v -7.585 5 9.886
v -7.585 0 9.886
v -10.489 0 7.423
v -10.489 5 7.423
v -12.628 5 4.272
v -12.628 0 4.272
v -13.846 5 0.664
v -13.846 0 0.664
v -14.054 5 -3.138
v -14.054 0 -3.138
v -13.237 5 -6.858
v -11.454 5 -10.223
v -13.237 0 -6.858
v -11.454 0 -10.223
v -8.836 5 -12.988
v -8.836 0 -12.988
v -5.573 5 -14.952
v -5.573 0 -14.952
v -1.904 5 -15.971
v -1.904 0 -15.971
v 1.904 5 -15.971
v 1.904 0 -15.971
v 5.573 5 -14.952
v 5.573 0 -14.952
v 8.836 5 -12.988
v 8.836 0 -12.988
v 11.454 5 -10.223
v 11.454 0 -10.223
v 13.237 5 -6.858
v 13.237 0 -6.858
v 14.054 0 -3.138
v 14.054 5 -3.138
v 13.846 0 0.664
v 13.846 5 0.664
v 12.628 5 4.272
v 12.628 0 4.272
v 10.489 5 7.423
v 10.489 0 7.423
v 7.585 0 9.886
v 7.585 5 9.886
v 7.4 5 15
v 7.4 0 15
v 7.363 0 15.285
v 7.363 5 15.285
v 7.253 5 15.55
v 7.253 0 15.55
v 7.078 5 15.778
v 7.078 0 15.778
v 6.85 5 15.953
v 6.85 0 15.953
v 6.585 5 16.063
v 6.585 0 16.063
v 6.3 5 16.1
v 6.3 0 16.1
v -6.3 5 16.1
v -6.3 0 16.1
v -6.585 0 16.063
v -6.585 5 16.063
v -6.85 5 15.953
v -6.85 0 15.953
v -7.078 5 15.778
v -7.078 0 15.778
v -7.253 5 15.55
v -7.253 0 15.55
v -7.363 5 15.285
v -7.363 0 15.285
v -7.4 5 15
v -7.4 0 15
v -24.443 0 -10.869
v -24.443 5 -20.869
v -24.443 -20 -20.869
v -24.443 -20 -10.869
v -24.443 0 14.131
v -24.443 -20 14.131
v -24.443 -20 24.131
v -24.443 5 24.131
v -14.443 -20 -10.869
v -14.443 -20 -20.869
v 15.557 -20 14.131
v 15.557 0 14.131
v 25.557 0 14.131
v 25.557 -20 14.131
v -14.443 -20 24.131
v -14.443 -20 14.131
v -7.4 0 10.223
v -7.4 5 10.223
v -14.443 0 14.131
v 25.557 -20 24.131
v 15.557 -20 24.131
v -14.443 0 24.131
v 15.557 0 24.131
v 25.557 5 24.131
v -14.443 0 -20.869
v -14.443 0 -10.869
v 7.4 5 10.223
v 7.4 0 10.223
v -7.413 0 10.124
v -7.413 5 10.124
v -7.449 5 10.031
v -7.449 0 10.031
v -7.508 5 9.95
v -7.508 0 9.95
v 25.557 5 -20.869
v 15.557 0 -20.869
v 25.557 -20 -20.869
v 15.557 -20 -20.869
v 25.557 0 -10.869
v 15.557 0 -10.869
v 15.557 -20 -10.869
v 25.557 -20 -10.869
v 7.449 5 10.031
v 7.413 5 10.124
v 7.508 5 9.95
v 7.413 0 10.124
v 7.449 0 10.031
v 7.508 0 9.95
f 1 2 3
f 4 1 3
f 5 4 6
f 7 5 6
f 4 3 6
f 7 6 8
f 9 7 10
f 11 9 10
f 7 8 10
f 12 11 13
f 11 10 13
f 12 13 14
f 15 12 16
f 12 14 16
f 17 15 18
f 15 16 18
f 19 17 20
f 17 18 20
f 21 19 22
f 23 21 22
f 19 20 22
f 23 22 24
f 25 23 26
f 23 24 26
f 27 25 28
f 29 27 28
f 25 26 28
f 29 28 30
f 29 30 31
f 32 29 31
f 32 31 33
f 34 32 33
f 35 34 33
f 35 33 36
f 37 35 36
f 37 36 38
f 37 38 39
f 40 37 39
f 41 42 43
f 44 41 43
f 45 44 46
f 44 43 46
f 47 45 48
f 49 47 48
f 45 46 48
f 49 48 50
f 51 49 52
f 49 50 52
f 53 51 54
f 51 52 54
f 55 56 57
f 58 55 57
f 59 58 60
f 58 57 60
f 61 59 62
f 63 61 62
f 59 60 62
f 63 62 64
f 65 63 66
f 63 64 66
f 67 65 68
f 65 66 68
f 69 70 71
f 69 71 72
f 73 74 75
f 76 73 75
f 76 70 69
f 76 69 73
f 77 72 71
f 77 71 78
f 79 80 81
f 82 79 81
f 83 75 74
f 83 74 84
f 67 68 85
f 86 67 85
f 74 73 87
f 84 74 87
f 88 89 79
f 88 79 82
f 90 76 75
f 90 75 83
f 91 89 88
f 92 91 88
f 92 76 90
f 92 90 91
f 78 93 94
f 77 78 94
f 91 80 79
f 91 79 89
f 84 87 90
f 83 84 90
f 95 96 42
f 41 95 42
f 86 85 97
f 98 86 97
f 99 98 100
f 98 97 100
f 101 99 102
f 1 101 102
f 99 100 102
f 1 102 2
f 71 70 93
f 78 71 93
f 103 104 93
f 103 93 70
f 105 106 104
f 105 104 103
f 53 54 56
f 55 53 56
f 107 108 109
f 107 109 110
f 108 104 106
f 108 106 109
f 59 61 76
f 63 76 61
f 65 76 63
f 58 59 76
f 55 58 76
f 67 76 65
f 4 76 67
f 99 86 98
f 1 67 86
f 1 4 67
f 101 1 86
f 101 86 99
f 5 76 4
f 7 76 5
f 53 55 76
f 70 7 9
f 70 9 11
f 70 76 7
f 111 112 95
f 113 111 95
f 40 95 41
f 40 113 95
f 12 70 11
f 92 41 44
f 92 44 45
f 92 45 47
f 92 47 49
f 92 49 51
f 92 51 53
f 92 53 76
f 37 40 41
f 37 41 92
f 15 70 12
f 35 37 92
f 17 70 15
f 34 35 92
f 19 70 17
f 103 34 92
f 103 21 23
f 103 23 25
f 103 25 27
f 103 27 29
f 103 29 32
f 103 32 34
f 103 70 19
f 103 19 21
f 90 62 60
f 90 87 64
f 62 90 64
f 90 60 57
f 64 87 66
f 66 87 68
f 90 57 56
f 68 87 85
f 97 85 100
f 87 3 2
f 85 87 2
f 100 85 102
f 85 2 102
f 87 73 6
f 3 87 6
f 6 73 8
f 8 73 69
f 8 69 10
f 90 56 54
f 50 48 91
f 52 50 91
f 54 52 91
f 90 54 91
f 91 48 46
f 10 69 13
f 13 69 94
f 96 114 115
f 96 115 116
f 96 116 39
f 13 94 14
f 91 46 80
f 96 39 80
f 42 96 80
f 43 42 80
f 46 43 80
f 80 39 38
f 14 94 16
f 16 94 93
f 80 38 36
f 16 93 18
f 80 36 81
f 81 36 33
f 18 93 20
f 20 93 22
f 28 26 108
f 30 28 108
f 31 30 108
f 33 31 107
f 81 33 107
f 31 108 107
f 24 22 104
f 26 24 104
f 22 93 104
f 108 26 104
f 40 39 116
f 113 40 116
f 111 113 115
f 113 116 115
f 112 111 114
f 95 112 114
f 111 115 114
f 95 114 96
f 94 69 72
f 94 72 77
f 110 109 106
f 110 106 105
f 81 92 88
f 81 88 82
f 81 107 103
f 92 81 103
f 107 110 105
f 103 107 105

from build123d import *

# Parameters (mm, degrees)
SKETCH1_W           = 50
SKETCH1_H           = 45
BOSS_EXTRUDE1_DEPTH = 5
SKETCH2_W           = 10
SKETCH2_H           = 10
BOSS_EXTRUDE2_DEPTH = 20


with BuildPart() as part:
    # Sketch1 → Boss-Extrude1 (new body)
    with BuildSketch(Plane(origin=(0, 0, 0), x_dir=(1, 0, 0), z_dir=(0, 1, 0))):
        with Locations((0.556666279, -1.630839984)):
            Rectangle(SKETCH1_W, SKETCH1_H)
        with BuildLine():
            Line((-7.4, -15), (-7.4, -10.223338333))
            ThreePointArc((-7.4, -10.223338333), (-7.449237284, -10.031074147), (-7.584827586, -9.886142793))
            ThreePointArc((-7.584827586, -9.886142793), (0, 16.1), (7.584827586, -9.886142793))
            ThreePointArc((7.584827586, -9.886142793), (7.449237284, -10.031074147), (7.4, -10.223338333))
            Line((7.4, -10.223338333), (7.4, -15))
            ThreePointArc((7.4, -15), (7.077817459, -15.777817459), (6.3, -16.1))
            Line((6.3, -16.1), (-6.3, -16.1))
            ThreePointArc((-6.3, -16.1), (-7.077817459, -15.777817459), (-7.4, -15))
        make_face(mode=Mode.SUBTRACT)
    extrude(amount=BOSS_EXTRUDE1_DEPTH)

    # Sketch2 → Boss-Extrude2 (add)
    with BuildSketch(Plane.XZ):
        with Locations((-19.443333721, 19.130839984)):
            Rectangle(SKETCH2_W, SKETCH2_H)
        with Locations((-19.443333721, -15.869160016)):
            Rectangle(SKETCH2_W, SKETCH2_H)
        with Locations((20.556666279, -15.869160016)):
            Rectangle(SKETCH2_W, SKETCH2_H)
        with Locations((20.556666279, 19.130839984)):
            Rectangle(SKETCH2_W, SKETCH2_H)
    extrude(amount=BOSS_EXTRUDE2_DEPTH)


solid = part.part
